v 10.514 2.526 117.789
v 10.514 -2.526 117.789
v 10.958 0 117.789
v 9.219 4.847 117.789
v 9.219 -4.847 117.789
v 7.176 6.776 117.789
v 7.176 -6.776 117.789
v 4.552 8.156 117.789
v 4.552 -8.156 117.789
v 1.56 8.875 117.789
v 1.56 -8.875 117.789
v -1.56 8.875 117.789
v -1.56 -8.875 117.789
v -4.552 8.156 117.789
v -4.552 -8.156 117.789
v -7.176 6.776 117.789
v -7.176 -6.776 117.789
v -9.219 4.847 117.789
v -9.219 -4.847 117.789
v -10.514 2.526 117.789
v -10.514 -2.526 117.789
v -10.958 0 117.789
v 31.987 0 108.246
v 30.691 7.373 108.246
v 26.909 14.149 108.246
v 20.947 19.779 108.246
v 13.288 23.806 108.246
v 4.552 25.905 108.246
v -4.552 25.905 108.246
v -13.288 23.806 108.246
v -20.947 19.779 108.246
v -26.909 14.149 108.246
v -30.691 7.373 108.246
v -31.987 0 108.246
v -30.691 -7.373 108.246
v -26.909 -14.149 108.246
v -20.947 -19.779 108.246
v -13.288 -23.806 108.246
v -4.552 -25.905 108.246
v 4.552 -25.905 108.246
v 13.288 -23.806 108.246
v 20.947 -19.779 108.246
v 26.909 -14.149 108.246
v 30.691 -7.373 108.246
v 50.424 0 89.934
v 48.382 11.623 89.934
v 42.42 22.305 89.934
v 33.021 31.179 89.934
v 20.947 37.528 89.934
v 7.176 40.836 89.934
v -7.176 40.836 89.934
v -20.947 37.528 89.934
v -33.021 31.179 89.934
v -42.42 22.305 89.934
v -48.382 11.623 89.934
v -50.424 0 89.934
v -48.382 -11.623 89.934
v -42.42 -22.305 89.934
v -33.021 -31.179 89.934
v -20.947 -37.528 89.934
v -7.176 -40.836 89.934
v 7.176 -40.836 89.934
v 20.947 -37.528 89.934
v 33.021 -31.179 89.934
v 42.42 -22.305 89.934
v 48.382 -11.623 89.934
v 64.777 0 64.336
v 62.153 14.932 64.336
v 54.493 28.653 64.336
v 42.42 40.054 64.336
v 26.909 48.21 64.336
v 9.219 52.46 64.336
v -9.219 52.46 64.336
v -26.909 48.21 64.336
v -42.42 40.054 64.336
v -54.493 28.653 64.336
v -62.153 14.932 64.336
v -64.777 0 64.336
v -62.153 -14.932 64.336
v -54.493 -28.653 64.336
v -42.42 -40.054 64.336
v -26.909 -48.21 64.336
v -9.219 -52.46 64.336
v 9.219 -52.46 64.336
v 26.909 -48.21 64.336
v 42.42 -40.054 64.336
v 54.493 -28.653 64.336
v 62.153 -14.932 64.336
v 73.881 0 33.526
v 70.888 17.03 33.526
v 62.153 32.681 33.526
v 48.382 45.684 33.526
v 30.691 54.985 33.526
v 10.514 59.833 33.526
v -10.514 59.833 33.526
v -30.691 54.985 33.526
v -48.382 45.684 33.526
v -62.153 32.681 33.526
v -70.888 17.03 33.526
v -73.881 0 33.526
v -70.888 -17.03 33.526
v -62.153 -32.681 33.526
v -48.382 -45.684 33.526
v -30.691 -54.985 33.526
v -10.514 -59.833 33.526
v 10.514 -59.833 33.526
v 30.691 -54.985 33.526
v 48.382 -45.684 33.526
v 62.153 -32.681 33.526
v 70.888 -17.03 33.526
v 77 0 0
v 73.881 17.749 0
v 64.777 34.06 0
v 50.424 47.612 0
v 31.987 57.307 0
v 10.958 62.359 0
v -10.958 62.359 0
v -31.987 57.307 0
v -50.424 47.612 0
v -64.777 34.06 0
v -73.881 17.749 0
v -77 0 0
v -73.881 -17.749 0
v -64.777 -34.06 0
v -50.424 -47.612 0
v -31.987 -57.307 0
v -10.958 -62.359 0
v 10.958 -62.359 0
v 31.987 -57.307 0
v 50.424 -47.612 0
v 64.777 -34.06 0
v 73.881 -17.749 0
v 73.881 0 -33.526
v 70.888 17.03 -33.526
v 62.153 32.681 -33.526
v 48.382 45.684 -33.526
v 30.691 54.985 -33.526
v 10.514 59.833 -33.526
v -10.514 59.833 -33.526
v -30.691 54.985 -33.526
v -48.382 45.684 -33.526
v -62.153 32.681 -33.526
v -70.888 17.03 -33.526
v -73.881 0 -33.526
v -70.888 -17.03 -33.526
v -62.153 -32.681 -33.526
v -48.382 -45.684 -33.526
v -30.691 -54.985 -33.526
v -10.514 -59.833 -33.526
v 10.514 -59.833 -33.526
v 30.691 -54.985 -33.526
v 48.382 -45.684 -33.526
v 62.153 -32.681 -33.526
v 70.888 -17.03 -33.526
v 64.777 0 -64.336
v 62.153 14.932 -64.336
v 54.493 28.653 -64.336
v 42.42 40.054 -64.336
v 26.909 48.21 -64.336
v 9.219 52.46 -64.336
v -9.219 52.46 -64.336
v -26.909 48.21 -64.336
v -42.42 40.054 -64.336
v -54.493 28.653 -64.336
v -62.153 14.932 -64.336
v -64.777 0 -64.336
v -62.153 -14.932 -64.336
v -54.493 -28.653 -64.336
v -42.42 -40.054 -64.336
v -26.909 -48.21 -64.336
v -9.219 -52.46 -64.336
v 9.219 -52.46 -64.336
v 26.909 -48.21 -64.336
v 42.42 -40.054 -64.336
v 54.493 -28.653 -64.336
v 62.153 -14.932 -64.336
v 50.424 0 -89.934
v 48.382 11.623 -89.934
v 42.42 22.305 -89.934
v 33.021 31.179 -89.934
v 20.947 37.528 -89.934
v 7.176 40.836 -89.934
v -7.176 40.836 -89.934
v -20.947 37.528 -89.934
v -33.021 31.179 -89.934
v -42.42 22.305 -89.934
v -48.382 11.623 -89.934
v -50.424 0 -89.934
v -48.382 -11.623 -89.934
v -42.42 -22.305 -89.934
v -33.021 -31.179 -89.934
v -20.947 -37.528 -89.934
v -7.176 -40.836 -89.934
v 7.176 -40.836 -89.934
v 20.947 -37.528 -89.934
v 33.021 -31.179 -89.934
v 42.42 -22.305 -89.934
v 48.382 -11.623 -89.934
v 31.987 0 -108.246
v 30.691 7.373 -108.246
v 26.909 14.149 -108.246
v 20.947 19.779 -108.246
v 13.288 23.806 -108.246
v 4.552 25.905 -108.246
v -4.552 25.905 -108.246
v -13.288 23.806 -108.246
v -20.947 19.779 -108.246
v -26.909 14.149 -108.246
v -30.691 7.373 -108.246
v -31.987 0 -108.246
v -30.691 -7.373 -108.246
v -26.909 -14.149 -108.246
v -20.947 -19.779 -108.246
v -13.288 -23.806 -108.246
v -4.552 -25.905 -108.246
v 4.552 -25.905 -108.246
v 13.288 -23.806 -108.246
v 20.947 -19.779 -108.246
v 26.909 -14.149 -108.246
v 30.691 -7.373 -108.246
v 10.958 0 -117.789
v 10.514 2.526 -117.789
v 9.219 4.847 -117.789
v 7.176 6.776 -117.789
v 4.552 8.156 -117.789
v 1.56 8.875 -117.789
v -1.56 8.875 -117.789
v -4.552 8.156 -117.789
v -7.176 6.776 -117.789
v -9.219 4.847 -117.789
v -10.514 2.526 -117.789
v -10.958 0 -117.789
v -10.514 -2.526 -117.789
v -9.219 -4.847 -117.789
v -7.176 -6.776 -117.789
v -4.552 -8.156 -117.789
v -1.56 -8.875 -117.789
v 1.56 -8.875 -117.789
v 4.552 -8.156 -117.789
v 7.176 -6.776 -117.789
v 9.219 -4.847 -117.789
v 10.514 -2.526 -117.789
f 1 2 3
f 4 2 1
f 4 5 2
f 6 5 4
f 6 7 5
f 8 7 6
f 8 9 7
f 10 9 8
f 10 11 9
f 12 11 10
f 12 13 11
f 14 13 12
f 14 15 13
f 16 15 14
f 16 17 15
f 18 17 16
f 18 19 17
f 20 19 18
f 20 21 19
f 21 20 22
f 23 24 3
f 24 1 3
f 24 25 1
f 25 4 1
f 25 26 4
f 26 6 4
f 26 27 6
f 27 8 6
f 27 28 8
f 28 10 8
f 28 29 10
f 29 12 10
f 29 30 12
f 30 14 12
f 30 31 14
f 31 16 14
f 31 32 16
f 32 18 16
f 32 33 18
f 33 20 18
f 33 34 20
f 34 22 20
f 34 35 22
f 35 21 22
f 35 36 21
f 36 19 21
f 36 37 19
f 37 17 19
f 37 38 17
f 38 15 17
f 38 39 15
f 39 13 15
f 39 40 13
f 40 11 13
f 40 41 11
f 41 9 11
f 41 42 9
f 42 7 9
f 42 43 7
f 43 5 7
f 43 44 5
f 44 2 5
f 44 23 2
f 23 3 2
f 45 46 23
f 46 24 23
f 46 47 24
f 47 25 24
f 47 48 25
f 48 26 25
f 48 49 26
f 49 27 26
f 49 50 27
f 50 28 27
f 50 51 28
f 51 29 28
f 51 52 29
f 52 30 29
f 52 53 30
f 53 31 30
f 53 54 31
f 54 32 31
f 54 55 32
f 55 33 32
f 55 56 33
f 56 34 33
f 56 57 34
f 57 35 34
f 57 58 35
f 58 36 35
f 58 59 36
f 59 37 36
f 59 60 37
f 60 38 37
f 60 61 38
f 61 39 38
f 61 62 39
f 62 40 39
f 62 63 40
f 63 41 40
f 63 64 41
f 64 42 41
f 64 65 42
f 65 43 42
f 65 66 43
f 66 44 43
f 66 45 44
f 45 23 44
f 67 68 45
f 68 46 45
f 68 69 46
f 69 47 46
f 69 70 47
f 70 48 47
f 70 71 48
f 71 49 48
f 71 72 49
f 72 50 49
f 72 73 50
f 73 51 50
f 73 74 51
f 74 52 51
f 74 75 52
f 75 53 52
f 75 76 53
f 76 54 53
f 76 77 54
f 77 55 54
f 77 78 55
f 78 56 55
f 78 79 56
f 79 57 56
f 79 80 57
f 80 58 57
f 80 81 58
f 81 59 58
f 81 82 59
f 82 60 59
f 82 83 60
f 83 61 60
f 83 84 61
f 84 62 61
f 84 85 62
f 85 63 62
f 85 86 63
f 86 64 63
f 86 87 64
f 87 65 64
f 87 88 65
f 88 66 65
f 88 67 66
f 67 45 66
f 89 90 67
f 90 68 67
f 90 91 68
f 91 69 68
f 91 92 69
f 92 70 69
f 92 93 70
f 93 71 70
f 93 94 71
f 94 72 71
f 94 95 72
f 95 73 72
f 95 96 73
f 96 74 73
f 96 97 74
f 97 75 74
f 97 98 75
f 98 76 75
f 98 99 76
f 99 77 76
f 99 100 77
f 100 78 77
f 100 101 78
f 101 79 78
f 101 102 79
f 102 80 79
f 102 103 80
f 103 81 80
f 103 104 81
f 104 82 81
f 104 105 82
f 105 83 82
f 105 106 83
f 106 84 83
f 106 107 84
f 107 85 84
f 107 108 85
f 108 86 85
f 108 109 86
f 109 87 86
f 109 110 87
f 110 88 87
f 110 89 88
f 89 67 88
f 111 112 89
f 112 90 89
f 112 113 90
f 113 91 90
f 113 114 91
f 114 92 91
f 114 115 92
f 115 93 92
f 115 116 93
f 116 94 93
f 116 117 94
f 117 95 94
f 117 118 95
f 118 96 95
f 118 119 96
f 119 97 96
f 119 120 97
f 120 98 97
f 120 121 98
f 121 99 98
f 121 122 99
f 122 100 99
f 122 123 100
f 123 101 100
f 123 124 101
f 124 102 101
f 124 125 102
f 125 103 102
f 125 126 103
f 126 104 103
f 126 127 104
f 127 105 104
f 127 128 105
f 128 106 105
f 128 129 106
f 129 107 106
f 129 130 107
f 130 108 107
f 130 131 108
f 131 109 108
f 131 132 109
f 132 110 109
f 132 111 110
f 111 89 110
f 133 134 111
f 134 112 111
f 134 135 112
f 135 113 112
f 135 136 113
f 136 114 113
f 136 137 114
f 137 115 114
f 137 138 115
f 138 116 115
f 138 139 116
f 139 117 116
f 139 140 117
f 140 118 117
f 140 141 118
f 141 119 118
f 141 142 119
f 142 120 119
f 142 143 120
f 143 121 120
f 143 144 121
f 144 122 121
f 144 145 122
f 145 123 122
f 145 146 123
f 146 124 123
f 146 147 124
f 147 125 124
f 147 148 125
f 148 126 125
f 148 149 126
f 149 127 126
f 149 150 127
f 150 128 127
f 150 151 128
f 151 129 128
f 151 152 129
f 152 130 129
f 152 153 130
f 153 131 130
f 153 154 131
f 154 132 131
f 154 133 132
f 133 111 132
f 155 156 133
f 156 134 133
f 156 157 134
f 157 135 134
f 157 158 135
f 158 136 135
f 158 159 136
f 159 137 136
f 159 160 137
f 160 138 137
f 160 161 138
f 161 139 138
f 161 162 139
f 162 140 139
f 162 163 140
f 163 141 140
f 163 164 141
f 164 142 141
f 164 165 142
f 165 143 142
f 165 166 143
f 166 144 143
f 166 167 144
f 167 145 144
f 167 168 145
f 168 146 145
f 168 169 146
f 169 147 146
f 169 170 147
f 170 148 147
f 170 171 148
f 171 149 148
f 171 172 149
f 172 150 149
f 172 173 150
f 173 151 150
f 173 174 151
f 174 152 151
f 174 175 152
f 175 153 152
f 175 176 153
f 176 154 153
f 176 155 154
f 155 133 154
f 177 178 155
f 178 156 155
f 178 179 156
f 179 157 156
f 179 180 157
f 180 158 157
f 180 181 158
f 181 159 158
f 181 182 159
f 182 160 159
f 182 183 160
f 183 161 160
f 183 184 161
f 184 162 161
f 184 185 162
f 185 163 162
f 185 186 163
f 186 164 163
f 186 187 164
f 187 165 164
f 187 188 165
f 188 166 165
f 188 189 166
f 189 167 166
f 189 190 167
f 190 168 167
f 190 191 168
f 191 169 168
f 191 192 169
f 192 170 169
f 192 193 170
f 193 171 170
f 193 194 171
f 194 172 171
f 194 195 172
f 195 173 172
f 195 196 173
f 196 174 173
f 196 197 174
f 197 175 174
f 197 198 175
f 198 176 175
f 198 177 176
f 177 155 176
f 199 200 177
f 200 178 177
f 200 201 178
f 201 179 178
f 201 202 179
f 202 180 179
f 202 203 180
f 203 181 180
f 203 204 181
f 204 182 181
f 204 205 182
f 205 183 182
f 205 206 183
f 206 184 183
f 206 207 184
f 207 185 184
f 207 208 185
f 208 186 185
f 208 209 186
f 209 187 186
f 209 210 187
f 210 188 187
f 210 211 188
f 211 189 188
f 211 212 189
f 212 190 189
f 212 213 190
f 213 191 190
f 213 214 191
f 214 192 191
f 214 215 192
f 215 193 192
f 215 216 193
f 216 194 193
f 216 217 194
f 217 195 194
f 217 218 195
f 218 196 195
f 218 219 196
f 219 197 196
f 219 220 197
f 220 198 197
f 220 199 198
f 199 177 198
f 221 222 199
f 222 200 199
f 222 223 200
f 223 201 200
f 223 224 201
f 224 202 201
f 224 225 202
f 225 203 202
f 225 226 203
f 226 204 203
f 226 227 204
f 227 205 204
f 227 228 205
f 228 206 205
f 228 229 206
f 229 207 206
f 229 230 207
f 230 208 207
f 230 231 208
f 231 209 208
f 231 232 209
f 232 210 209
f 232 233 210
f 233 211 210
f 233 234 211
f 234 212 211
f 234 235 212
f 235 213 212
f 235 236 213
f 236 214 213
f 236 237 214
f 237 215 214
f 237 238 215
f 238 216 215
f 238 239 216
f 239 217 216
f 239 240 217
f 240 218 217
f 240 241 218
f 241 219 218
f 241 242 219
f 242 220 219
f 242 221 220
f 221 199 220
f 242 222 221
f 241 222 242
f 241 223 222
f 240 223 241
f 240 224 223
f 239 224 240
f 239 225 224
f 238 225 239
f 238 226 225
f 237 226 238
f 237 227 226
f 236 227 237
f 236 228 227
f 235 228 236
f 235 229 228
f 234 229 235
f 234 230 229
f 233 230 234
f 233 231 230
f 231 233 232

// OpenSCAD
// Generated by SolidPython 1.0.1 on 2020-07-29 00:46:49


scale(v = [11, 9, 17]) {
	sphere(r = 7);
}
/***********************************************
*********      SolidPython code:      **********
************************************************
 
# import packages: SolidPython
from solid import *
from solid.utils import *
from itertools import chain, combinations, permutations


class Resize:

    def __init__(self, scad_file):
        self.scad_file = scad_file
        #self.scad_file = import_scad(scad_file)
        # cone/cylinder param:
        self.r1 = 0
        self.r2 = 0
        self.h = 0
        # rectangular prism param:
        self.w = 0
        self.l = 0
        # ellipse param:
        self.r = 0

    # import OpenScad code (file name corresponds to shape)


    # classify shape + parameters
    def assign(self, param1, param2, param3):
        if self.scad_file == 'cone.scad':
            self.r1 = param1
            self.r2 = param2
            self.h = param3
        elif self.scad_file == 'cylinder.scad':
            self.r1 = param1
            self.r2 = param2
            self.h = param3
        elif self.scad_file == 'rectangularPrism.scad':
            self.h = param1
            self.l = param2
            self.w = param3
        else:
            self.r = param1
            self.h = param2

    # resize parameters
    def iterate(self):
        x = range(3, 20, 2)
        i = 1
        if self.scad_file == 'cone.scad':
            tempList = list(permutations(x, 2))
            for temp in tempList:
                param1 = temp[0]
                param2 = temp[1]
                filepath = 'produced_scad_files/' + 'cone' + str(param1) + '_' + str(param2) + '_' + '.scad'
                scad_render_to_file(cylinder(h=param1, r1=param2, r2=0), filepath)

        elif self.scad_file == 'cylinder.scad':
            tempList = list(permutations(x, 3))
            for temp in tempList:
                param1 = temp[0]
                param2 = temp[1]
                filepath = 'produced_scad_files/' + 'cylinder' + str(param1) + '_' + str(param2) + '_' + '.scad'
                scad_render_to_file(cylinder(h=param1, r1=param2, r2=param2), filepath)

        elif self.scad_file == 'rectangularPrism.scad':
            tempList = list(permutations(x, 3))
            for temp in tempList:
                param1 = temp[0]
                param2 = temp[1]
                param3 = temp[2]
                filepath = 'produced_scad_files/' + 'rectangularPrism' + str(param1) + '_' + str(param2) + '_' + str(
                    param3) + '.scad'
                scad_render_to_file(cube(size=(param1, param2, param3)), filepath)

        elif self.scad_file == 'ellipse.scad':
            tempList = list(permutations(x, 4))
            for temp in tempList:
                param1 = temp[0]
                param2 = temp[1]
                param3 = temp[2]
                param4 = temp[3]
                filepath = 'produced_scad_files/' + 'ellipse' + str(param1) + '_' + str(param2) + '_' + str(param3) + '_' + str(param4) + '.scad'
                scad_render_to_file(scale([param1, param2, param3])(sphere(r=param4)), filepath)

    def render_to_scadfile(self):
        scad_render_to_file(scad, 'example.scad') 
 
************************************************/
